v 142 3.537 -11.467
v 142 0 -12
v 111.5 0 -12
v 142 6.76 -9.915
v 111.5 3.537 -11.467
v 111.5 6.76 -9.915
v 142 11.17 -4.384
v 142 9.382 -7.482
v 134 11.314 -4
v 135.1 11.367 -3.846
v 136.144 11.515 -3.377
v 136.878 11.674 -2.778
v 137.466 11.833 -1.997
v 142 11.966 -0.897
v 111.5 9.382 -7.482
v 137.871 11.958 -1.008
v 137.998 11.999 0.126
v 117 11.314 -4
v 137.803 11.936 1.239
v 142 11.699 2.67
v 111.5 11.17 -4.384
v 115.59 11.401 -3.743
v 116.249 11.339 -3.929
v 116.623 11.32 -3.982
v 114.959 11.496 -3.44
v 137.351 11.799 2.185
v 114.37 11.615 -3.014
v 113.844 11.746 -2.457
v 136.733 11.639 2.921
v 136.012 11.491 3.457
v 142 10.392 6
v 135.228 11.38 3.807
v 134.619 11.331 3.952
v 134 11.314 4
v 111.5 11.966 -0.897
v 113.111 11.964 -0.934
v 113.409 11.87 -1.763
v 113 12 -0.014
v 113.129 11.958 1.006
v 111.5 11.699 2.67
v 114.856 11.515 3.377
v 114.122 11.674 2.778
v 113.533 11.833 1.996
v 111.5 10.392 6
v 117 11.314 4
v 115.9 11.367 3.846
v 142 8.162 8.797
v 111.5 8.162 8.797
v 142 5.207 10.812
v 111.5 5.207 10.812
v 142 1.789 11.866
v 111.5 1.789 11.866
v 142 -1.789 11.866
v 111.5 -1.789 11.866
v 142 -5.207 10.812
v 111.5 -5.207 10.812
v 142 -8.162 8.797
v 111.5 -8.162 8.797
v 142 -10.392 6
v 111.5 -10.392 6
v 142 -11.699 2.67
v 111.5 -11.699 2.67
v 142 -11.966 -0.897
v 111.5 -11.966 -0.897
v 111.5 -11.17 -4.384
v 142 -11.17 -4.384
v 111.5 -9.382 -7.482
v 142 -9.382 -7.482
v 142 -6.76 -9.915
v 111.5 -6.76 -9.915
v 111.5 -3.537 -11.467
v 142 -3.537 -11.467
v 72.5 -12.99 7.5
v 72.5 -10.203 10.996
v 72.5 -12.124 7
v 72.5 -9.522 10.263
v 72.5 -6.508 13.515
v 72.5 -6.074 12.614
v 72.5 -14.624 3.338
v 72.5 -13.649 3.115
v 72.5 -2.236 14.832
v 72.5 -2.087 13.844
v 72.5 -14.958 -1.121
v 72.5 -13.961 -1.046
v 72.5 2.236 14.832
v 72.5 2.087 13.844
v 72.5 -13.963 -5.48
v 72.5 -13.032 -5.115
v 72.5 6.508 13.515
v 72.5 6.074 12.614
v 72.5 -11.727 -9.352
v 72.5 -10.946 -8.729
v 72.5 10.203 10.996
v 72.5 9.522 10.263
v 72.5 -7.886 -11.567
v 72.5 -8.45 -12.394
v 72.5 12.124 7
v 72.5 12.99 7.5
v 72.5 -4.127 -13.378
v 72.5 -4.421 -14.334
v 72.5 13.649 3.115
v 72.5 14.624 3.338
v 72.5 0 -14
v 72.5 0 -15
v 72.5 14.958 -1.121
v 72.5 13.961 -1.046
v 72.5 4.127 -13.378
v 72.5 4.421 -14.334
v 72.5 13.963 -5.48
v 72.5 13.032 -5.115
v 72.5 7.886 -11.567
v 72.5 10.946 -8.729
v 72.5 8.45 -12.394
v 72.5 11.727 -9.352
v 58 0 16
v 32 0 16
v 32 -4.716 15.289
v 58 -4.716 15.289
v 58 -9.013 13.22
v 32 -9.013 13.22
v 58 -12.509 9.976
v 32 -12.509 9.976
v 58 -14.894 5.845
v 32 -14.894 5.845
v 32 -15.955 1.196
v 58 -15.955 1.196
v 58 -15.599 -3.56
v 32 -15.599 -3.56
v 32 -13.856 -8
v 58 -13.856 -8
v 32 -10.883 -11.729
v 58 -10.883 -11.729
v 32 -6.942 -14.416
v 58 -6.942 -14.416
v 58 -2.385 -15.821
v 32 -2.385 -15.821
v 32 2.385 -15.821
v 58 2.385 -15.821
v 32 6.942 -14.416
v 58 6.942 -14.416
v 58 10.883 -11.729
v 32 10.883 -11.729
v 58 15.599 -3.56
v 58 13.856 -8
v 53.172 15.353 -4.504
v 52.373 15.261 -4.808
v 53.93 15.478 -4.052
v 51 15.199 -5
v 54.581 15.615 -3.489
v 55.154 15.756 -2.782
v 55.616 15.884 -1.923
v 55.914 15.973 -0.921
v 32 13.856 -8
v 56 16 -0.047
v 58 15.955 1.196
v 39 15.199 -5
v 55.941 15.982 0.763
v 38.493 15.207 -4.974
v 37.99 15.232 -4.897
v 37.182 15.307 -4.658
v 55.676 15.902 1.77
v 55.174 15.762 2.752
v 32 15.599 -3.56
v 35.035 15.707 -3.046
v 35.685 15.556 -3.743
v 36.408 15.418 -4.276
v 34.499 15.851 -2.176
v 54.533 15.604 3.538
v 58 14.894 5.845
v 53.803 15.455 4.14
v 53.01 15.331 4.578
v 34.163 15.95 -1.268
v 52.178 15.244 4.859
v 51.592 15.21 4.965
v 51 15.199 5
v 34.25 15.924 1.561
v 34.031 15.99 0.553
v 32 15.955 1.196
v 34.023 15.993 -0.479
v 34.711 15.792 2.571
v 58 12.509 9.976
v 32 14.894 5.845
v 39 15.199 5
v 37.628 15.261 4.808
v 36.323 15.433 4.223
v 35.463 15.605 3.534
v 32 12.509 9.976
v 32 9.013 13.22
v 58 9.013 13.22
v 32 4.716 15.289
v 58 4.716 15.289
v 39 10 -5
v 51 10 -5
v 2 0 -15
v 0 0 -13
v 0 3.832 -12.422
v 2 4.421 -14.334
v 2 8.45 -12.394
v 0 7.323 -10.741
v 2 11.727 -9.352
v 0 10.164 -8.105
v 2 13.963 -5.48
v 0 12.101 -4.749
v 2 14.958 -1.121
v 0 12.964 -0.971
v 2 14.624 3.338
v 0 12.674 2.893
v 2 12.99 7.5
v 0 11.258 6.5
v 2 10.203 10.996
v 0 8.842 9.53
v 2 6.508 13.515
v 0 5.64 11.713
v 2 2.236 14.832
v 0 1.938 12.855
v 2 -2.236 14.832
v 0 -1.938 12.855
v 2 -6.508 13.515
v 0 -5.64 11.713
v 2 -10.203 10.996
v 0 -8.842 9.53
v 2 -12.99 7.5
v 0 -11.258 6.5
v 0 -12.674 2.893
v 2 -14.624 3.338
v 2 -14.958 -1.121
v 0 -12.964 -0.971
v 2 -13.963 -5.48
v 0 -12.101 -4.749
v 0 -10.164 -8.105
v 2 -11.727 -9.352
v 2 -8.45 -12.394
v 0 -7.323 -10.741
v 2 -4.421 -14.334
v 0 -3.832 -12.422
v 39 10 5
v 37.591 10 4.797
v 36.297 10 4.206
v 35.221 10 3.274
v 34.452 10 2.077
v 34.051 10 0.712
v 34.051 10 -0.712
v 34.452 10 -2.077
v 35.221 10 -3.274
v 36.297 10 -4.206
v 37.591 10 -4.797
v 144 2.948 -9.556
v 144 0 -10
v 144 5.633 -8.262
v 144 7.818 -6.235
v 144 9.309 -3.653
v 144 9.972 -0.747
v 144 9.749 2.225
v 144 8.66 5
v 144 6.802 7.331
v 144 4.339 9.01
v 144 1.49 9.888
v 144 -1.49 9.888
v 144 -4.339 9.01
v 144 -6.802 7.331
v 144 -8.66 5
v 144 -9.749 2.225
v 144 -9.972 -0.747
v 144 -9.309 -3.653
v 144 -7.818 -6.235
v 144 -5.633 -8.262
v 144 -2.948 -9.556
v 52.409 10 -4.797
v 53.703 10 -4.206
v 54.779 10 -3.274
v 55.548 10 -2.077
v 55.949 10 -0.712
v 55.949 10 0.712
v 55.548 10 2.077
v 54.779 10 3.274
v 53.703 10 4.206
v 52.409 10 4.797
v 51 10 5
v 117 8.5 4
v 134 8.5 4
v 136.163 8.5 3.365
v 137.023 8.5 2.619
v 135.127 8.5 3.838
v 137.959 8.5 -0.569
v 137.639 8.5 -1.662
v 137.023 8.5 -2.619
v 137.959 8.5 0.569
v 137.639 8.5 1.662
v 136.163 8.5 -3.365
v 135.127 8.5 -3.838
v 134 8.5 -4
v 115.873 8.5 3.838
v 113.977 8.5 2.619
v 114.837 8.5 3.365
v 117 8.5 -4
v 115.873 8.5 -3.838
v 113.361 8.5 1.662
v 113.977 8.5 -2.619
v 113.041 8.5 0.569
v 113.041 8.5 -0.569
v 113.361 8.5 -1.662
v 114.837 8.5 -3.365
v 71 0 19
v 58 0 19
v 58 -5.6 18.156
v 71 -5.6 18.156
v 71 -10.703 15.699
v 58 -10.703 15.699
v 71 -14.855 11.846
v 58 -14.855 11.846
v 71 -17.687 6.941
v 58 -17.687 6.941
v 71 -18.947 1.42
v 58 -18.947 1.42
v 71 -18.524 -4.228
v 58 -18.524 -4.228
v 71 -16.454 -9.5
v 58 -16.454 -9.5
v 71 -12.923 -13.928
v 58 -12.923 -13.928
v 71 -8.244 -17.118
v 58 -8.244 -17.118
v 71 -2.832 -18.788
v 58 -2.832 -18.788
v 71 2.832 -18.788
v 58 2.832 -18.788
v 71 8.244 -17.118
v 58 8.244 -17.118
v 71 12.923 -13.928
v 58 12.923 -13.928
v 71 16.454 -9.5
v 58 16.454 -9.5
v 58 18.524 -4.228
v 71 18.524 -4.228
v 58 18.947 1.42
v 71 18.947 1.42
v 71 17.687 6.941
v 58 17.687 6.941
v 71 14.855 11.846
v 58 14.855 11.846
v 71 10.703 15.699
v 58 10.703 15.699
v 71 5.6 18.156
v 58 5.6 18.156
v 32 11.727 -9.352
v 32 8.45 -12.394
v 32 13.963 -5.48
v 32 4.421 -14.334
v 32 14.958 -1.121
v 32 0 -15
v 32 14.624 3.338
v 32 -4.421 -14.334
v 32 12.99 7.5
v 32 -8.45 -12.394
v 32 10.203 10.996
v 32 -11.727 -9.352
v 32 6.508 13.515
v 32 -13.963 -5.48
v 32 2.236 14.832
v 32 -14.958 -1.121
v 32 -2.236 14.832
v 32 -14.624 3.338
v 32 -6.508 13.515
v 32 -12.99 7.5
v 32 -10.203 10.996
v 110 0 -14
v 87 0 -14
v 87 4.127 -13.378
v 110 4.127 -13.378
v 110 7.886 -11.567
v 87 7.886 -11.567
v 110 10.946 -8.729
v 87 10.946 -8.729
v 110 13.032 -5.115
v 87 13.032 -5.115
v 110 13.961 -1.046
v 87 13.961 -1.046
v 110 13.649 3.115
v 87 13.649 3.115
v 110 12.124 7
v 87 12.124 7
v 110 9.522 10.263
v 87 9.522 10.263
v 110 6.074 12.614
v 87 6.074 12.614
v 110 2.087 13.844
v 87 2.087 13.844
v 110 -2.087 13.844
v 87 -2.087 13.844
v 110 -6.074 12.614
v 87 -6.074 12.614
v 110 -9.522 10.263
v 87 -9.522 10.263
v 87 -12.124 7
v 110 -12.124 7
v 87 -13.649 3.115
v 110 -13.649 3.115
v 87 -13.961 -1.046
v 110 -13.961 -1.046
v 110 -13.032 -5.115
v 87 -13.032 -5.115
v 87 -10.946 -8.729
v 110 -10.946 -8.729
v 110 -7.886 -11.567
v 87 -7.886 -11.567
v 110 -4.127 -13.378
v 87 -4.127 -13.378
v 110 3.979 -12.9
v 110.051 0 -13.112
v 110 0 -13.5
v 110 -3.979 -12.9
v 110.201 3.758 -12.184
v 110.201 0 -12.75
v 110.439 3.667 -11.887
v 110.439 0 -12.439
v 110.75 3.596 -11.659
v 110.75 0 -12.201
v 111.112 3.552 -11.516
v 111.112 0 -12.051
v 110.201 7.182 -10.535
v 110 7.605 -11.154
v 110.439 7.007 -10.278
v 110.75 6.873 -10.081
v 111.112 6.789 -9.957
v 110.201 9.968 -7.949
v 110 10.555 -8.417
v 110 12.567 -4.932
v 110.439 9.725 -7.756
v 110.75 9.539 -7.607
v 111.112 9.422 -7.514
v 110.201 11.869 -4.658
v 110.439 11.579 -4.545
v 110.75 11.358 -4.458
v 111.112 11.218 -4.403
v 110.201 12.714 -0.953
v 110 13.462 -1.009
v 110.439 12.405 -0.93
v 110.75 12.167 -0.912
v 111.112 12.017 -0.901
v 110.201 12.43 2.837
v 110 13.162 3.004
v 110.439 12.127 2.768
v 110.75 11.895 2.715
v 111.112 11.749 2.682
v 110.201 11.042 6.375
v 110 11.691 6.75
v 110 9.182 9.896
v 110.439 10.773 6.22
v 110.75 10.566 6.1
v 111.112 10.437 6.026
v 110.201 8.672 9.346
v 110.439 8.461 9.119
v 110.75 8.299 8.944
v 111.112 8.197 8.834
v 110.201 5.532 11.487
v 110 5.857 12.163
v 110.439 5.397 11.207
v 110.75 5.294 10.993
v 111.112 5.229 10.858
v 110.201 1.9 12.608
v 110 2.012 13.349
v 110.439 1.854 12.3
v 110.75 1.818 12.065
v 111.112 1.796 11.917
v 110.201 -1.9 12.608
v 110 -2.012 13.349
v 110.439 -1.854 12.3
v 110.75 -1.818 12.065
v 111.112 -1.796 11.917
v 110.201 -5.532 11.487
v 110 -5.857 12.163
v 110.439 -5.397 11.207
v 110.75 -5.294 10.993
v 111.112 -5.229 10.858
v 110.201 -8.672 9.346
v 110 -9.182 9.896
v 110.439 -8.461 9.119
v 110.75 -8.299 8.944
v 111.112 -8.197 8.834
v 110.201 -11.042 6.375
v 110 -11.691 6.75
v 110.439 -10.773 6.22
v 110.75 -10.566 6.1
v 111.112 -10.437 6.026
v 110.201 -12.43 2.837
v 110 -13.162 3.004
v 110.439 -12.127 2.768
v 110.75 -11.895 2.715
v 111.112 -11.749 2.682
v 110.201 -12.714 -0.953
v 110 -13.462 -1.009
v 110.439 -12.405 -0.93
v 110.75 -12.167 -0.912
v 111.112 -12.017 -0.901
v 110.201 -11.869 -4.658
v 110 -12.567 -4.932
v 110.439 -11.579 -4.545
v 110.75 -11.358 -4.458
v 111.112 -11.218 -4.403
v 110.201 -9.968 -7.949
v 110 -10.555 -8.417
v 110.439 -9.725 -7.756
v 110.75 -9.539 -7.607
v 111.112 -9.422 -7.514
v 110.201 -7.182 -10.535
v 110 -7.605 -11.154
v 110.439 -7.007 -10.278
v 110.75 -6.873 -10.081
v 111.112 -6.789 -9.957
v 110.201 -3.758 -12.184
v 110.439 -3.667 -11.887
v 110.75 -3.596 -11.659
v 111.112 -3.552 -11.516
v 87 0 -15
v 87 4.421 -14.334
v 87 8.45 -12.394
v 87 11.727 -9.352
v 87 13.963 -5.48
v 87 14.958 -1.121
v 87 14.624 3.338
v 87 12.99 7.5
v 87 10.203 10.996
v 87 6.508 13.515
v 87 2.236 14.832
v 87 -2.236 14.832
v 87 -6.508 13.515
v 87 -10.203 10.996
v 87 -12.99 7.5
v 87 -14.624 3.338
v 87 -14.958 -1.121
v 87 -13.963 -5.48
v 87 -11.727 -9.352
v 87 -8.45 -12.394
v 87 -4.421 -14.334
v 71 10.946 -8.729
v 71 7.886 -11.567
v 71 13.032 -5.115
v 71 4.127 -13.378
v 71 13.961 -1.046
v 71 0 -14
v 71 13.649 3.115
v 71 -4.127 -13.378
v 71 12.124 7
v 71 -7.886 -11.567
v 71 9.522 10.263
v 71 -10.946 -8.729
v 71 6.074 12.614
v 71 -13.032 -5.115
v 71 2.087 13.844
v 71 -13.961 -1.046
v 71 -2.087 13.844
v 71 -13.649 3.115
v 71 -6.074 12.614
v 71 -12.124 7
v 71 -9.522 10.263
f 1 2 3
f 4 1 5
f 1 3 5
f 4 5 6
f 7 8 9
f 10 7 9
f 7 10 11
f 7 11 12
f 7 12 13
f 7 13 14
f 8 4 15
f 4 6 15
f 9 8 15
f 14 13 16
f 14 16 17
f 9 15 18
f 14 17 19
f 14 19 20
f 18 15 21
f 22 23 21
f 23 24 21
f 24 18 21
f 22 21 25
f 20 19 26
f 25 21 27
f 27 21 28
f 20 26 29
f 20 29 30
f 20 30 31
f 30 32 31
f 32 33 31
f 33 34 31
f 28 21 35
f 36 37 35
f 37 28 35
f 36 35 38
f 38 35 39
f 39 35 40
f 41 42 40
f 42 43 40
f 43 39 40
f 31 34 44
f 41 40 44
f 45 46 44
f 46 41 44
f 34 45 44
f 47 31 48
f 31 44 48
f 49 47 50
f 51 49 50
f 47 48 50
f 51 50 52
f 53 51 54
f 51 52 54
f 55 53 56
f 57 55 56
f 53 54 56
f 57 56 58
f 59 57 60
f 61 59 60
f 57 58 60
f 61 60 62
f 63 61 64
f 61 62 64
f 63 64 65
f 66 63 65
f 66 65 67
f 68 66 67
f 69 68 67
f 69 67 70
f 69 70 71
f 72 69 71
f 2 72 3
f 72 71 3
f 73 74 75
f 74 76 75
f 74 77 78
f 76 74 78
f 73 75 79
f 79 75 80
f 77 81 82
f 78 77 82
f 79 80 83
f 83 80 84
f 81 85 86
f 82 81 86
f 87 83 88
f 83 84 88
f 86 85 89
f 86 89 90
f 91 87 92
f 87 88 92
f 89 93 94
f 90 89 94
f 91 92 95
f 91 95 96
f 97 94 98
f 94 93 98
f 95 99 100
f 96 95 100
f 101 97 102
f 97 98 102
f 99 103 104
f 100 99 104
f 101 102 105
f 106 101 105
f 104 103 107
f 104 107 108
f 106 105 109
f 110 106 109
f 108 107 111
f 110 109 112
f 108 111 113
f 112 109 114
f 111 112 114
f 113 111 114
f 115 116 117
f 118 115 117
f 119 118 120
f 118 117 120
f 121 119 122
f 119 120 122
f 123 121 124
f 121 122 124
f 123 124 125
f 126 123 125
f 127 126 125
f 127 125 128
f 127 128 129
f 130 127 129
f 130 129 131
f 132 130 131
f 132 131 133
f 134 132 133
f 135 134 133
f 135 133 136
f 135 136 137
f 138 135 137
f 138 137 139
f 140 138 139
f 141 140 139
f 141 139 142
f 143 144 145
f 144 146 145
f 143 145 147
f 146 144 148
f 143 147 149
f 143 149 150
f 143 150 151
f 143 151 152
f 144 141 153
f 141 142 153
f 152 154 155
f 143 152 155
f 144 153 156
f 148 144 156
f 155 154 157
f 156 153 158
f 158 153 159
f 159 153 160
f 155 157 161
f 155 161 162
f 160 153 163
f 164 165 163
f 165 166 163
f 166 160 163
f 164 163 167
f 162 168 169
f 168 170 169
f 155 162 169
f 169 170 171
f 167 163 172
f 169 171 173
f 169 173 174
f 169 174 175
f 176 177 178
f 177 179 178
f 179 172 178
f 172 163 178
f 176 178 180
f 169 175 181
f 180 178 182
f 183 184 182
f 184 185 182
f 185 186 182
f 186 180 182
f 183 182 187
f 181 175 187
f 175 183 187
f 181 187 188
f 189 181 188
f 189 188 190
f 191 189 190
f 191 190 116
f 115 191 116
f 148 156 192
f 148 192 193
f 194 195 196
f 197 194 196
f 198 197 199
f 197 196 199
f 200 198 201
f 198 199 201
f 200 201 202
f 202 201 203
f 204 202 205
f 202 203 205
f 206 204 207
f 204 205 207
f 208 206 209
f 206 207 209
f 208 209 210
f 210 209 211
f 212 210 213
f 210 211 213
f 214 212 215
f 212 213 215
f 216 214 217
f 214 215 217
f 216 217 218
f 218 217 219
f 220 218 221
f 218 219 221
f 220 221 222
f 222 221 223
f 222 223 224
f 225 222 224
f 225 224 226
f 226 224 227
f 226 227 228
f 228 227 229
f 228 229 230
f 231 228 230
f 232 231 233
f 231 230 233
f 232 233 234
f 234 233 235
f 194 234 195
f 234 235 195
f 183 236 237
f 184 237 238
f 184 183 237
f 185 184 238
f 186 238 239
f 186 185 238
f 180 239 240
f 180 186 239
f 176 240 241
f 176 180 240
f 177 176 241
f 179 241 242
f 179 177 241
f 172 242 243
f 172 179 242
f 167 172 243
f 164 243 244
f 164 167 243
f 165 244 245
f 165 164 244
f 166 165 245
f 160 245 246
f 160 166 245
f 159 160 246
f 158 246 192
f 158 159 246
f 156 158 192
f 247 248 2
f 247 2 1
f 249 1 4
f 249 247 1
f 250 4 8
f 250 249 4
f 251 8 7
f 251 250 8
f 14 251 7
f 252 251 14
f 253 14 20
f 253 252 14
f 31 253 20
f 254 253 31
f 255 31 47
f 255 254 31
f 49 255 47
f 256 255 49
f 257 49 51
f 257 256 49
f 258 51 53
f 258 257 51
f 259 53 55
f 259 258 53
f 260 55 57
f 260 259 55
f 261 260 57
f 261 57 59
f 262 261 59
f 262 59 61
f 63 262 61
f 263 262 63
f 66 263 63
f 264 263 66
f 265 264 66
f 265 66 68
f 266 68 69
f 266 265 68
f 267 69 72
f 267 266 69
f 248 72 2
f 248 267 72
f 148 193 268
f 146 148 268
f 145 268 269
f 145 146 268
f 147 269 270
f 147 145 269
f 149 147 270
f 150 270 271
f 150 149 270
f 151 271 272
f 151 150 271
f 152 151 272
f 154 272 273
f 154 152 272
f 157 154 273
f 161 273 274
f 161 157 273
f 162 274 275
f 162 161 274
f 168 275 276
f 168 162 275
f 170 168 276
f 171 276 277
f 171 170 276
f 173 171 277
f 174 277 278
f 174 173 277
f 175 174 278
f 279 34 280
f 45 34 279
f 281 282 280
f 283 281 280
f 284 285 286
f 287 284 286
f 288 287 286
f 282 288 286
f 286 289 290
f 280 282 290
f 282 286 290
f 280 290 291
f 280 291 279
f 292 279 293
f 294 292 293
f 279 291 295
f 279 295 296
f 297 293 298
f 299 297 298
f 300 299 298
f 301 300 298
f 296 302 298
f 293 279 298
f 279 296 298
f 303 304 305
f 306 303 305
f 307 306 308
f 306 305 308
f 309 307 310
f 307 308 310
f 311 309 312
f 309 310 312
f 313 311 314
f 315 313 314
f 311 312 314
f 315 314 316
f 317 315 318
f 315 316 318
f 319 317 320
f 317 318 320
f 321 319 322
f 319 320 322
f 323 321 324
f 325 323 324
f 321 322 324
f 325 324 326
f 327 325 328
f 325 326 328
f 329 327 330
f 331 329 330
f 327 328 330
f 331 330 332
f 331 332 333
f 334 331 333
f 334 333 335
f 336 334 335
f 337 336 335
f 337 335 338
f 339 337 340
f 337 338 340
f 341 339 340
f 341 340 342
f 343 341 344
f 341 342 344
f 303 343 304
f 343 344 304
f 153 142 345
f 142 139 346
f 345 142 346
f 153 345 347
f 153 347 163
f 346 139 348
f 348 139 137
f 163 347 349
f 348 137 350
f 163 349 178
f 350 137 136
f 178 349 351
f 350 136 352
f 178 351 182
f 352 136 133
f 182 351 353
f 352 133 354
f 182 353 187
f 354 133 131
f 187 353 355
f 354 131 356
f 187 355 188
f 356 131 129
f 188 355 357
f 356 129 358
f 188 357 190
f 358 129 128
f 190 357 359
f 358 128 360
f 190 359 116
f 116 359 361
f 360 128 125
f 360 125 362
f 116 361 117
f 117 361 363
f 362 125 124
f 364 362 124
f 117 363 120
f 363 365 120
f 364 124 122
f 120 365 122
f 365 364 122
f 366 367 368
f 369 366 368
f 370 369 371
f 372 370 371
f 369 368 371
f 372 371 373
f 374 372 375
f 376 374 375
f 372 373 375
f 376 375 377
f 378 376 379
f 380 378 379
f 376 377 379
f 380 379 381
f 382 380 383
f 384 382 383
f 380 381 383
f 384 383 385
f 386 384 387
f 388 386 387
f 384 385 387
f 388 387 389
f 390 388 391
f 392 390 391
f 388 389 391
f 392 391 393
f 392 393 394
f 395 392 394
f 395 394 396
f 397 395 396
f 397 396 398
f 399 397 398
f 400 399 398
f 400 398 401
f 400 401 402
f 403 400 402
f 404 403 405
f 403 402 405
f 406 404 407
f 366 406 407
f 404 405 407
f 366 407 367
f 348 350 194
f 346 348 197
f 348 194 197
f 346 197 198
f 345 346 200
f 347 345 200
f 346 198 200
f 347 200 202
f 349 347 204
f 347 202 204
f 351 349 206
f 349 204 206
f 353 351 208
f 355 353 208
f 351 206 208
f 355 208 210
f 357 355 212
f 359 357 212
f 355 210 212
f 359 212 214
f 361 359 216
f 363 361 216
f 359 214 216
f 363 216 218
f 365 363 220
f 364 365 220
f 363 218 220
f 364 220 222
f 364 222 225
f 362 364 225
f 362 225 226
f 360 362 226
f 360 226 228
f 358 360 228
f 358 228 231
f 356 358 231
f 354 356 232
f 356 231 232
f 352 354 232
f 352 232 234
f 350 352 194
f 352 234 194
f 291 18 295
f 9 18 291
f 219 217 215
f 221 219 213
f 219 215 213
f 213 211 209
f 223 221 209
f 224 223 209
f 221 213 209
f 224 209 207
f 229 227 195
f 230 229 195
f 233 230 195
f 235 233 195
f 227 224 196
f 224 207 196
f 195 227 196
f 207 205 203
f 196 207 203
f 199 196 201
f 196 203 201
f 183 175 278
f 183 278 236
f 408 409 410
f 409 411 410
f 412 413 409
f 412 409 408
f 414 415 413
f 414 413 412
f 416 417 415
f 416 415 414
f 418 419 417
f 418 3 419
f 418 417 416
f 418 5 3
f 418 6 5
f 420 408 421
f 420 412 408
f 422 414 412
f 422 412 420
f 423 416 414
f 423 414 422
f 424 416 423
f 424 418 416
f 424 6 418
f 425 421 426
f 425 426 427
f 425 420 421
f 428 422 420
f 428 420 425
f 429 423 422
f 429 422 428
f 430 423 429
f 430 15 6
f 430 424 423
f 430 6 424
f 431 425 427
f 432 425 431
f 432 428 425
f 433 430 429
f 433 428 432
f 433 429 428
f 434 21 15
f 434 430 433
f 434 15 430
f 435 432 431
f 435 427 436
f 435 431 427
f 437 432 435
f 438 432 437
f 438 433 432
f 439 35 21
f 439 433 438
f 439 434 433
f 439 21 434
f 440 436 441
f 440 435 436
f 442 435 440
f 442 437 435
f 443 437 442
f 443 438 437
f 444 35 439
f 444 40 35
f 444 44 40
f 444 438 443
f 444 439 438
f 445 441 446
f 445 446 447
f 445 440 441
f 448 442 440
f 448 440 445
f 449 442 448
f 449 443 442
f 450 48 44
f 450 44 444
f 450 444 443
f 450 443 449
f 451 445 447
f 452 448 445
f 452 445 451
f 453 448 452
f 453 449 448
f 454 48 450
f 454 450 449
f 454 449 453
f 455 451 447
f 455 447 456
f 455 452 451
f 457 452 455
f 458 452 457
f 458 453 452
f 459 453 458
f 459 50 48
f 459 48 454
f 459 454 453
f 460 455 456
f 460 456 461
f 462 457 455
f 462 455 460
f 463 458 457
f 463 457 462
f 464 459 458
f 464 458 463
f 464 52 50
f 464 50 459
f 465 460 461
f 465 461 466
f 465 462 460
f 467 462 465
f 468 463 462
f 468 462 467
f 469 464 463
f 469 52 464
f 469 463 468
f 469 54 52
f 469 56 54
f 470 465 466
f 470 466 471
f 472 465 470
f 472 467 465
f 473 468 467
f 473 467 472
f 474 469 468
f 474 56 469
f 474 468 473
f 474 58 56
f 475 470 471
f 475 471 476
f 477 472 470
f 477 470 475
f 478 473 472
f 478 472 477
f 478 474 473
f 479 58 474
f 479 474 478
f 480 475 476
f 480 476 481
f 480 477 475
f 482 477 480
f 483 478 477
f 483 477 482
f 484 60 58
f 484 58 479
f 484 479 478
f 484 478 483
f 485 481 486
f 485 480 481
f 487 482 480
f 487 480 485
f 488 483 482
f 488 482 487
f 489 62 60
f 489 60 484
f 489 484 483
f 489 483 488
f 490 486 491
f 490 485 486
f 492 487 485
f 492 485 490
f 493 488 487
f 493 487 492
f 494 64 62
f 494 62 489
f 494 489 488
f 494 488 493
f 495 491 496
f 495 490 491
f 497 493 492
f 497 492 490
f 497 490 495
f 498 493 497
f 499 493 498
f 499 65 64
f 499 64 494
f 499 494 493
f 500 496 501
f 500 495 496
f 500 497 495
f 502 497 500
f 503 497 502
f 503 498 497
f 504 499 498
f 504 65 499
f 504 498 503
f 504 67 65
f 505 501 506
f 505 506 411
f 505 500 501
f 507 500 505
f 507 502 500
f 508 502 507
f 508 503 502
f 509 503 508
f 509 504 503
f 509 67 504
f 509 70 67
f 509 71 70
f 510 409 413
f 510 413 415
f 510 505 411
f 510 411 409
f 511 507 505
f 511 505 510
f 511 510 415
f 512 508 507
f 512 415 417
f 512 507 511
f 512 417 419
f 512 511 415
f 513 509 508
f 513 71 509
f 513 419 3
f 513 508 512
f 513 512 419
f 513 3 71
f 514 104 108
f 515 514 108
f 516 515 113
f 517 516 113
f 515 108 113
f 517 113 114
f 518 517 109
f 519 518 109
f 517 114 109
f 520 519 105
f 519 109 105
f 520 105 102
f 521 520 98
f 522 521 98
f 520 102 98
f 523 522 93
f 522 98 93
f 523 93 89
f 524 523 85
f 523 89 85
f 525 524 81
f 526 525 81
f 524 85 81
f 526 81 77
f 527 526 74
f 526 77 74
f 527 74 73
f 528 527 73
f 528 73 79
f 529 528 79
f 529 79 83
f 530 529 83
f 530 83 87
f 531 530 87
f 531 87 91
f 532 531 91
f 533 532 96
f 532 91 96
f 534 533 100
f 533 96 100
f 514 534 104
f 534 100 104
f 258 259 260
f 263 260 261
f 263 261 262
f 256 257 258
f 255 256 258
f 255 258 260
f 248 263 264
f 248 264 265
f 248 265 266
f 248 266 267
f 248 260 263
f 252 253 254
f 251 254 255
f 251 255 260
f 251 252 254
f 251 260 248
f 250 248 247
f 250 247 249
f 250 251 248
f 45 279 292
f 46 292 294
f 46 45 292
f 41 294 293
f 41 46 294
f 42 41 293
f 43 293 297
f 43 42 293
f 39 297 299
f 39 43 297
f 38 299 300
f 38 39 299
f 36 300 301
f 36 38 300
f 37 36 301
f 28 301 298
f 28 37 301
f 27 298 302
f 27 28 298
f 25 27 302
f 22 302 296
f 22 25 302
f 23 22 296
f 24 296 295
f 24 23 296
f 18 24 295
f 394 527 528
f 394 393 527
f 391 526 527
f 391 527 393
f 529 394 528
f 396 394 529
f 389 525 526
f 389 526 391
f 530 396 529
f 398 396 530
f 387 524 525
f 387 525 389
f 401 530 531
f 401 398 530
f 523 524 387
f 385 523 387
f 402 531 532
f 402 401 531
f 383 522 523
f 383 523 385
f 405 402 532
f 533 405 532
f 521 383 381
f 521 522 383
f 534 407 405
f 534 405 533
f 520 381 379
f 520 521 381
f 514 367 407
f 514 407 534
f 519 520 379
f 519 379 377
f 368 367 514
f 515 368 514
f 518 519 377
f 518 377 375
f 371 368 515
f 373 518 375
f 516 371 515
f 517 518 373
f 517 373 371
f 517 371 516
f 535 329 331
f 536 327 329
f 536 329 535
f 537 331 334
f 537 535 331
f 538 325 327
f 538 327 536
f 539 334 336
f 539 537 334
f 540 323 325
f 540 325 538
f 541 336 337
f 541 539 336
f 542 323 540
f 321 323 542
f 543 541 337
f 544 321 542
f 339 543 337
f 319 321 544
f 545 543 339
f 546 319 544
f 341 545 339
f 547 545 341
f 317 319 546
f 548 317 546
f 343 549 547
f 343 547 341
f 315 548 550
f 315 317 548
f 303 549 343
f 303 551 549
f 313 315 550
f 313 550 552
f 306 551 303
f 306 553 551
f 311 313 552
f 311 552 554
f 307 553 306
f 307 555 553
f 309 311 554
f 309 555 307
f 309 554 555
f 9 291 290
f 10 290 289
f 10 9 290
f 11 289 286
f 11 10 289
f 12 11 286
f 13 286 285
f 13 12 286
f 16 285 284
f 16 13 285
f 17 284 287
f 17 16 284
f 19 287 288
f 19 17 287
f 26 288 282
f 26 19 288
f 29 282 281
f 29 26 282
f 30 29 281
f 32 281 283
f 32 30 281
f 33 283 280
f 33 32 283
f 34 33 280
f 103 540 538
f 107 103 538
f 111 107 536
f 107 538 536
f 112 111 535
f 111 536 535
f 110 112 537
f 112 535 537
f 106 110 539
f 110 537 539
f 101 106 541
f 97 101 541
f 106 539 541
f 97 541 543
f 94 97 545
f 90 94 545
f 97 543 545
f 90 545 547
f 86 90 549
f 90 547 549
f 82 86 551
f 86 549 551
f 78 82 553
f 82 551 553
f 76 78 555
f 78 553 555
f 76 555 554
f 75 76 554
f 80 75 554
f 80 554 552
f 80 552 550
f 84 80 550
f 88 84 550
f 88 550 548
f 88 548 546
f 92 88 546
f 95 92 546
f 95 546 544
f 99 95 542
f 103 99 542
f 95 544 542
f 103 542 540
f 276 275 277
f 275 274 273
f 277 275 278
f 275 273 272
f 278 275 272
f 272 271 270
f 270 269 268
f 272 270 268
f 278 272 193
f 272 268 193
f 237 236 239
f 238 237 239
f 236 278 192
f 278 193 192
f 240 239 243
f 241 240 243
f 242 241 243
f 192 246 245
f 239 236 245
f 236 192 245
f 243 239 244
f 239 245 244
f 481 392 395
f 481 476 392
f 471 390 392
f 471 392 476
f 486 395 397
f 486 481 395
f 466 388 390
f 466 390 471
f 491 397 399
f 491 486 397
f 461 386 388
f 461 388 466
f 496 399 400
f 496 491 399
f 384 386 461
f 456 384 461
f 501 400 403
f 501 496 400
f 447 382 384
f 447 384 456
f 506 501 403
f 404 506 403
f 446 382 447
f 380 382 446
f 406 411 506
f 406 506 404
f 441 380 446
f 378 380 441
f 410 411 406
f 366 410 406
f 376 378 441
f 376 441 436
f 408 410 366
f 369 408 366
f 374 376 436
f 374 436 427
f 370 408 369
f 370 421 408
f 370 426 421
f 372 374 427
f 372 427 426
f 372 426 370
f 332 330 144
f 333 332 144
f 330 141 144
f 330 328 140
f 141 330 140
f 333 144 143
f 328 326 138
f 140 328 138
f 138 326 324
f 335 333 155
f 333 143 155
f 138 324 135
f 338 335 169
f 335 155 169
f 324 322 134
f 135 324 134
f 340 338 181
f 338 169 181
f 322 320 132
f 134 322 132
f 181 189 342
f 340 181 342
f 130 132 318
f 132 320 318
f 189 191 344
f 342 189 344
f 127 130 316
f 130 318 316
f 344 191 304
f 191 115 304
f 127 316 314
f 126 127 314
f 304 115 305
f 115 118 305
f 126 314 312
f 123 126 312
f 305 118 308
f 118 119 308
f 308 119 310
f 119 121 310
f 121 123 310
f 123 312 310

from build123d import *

# Parameters (mm, degrees)
SKETCH_1_R          = 15
EXTRUDE_1_DEPTH     = 32
CHAMFER_1_SIZE      = 2
SKETCH_2_R          = 16
EXTRUDE_2_DEPTH     = 26
SKETCH_3_R          = 19
EXTRUDE_3_DEPTH     = 13
SKETCH_4_R          = 14
EXTRUDE_4_DEPTH     = 1.5
SKETCH_5_R          = 15
EXTRUDE_5_DEPTH     = 14.5
SKETCH_6_R          = 14
EXTRUDE_6_DEPTH     = 23
SKETCH_7_R          = 12
EXTRUDE_7_DEPTH     = 34
FILLET_1_R          = 1.5
CHAMFER_2_SIZE      = 2
CUT_EXTRUDE_START   = 16
CUT_EXTRUDE_1_DEPTH = 6
CUT_EXTRUDE_START_2 = 12
CUT_EXTRUDE_2_DEPTH = 3.5


with BuildPart() as part:
    # 草图1 → 凸台-拉伸1 (new body)
    with BuildSketch(Plane(origin=(0, 0, 0), x_dir=(0, 0, -1), z_dir=(1, 0, 0))):
        Circle(SKETCH_1_R)
    extrude(amount=EXTRUDE_1_DEPTH)

    # 倒角1
    chamfer_1_edges = [part.edges().sort_by_distance(p)[0] for p in [
        (0, 0, 15),
    ]]
    chamfer(chamfer_1_edges, length=CHAMFER_1_SIZE)

    # 草图2 → 凸台-拉伸2 (add)
    with BuildSketch(Plane(origin=(32, 0, 0), x_dir=(0, 0, -1), z_dir=(1, 0, 0))):
        Circle(SKETCH_2_R)
    extrude(amount=EXTRUDE_2_DEPTH)

    # 草图3 → 凸台-拉伸3 (add)
    with BuildSketch(Plane(origin=(58, 0, 0), x_dir=(0, 0, -1), z_dir=(1, 0, 0))):
        Circle(SKETCH_3_R)
    extrude(amount=EXTRUDE_3_DEPTH)

    # 草图4 → 凸台-拉伸4 (add)
    with BuildSketch(Plane(origin=(71, 0, 0), x_dir=(0, 0, -1), z_dir=(1, 0, 0))):
        Circle(SKETCH_4_R)
    extrude(amount=EXTRUDE_4_DEPTH)

    # 草图5 → 凸台-拉伸5 (add)
    with BuildSketch(Plane(origin=(72.5, 0, 0), x_dir=(0, 0, -1), z_dir=(1, 0, 0))):
        Circle(SKETCH_5_R)
    extrude(amount=EXTRUDE_5_DEPTH)

    # 草图6 → 凸台-拉伸6 (add)
    with BuildSketch(Plane(origin=(87, 0, 0), x_dir=(0, 0, -1), z_dir=(1, 0, 0))):
        Circle(SKETCH_6_R)
    extrude(amount=EXTRUDE_6_DEPTH)

    # 草图7 → 凸台-拉伸7 (add)
    with BuildSketch(Plane(origin=(110, 0, 0), x_dir=(0, 0, -1), z_dir=(1, 0, 0))):
        Circle(SKETCH_7_R)
    extrude(amount=EXTRUDE_7_DEPTH)

    # 圆角1
    fillet_1_edges = [part.edges().sort_by_distance(p)[0] for p in [
        (110, 0, 12),
    ]]
    fillet(fillet_1_edges, radius=FILLET_1_R)

    # 倒角2
    chamfer_2_edges = [part.edges().sort_by_distance(p)[0] for p in [
        (144, 0, 12),
    ]]
    chamfer(chamfer_2_edges, length=CHAMFER_2_SIZE)

    # 草图8 → 切除-拉伸1 (cut)
    with BuildSketch(Plane(origin=(0, 0, 0), x_dir=(1, 0, 0), z_dir=(0, 1, 0)).offset(CUT_EXTRUDE_START)):
        with BuildLine():
            Line((39, 5), (51, 5))
            ThreePointArc((51, 5), (56, 0), (51, -5))
            Line((51, -5), (39, -5))
            ThreePointArc((39, -5), (34, 0), (39, 5))
        make_face()
    extrude(amount=-CUT_EXTRUDE_1_DEPTH, mode=Mode.SUBTRACT)

    # 草图9 → 切除-拉伸2 (cut)
    with BuildSketch(Plane(origin=(0, 0, 0), x_dir=(1, 0, 0), z_dir=(0, 1, 0)).offset(CUT_EXTRUDE_START_2)):
        with BuildLine():
            Line((117, 4), (134, 4))
            ThreePointArc((134, 4), (138, 0), (134, -4))
            Line((134, -4), (117, -4))
            ThreePointArc((117, -4), (113, 0), (117, 4))
        make_face()
    extrude(amount=-CUT_EXTRUDE_2_DEPTH, mode=Mode.SUBTRACT)


solid = part.part
